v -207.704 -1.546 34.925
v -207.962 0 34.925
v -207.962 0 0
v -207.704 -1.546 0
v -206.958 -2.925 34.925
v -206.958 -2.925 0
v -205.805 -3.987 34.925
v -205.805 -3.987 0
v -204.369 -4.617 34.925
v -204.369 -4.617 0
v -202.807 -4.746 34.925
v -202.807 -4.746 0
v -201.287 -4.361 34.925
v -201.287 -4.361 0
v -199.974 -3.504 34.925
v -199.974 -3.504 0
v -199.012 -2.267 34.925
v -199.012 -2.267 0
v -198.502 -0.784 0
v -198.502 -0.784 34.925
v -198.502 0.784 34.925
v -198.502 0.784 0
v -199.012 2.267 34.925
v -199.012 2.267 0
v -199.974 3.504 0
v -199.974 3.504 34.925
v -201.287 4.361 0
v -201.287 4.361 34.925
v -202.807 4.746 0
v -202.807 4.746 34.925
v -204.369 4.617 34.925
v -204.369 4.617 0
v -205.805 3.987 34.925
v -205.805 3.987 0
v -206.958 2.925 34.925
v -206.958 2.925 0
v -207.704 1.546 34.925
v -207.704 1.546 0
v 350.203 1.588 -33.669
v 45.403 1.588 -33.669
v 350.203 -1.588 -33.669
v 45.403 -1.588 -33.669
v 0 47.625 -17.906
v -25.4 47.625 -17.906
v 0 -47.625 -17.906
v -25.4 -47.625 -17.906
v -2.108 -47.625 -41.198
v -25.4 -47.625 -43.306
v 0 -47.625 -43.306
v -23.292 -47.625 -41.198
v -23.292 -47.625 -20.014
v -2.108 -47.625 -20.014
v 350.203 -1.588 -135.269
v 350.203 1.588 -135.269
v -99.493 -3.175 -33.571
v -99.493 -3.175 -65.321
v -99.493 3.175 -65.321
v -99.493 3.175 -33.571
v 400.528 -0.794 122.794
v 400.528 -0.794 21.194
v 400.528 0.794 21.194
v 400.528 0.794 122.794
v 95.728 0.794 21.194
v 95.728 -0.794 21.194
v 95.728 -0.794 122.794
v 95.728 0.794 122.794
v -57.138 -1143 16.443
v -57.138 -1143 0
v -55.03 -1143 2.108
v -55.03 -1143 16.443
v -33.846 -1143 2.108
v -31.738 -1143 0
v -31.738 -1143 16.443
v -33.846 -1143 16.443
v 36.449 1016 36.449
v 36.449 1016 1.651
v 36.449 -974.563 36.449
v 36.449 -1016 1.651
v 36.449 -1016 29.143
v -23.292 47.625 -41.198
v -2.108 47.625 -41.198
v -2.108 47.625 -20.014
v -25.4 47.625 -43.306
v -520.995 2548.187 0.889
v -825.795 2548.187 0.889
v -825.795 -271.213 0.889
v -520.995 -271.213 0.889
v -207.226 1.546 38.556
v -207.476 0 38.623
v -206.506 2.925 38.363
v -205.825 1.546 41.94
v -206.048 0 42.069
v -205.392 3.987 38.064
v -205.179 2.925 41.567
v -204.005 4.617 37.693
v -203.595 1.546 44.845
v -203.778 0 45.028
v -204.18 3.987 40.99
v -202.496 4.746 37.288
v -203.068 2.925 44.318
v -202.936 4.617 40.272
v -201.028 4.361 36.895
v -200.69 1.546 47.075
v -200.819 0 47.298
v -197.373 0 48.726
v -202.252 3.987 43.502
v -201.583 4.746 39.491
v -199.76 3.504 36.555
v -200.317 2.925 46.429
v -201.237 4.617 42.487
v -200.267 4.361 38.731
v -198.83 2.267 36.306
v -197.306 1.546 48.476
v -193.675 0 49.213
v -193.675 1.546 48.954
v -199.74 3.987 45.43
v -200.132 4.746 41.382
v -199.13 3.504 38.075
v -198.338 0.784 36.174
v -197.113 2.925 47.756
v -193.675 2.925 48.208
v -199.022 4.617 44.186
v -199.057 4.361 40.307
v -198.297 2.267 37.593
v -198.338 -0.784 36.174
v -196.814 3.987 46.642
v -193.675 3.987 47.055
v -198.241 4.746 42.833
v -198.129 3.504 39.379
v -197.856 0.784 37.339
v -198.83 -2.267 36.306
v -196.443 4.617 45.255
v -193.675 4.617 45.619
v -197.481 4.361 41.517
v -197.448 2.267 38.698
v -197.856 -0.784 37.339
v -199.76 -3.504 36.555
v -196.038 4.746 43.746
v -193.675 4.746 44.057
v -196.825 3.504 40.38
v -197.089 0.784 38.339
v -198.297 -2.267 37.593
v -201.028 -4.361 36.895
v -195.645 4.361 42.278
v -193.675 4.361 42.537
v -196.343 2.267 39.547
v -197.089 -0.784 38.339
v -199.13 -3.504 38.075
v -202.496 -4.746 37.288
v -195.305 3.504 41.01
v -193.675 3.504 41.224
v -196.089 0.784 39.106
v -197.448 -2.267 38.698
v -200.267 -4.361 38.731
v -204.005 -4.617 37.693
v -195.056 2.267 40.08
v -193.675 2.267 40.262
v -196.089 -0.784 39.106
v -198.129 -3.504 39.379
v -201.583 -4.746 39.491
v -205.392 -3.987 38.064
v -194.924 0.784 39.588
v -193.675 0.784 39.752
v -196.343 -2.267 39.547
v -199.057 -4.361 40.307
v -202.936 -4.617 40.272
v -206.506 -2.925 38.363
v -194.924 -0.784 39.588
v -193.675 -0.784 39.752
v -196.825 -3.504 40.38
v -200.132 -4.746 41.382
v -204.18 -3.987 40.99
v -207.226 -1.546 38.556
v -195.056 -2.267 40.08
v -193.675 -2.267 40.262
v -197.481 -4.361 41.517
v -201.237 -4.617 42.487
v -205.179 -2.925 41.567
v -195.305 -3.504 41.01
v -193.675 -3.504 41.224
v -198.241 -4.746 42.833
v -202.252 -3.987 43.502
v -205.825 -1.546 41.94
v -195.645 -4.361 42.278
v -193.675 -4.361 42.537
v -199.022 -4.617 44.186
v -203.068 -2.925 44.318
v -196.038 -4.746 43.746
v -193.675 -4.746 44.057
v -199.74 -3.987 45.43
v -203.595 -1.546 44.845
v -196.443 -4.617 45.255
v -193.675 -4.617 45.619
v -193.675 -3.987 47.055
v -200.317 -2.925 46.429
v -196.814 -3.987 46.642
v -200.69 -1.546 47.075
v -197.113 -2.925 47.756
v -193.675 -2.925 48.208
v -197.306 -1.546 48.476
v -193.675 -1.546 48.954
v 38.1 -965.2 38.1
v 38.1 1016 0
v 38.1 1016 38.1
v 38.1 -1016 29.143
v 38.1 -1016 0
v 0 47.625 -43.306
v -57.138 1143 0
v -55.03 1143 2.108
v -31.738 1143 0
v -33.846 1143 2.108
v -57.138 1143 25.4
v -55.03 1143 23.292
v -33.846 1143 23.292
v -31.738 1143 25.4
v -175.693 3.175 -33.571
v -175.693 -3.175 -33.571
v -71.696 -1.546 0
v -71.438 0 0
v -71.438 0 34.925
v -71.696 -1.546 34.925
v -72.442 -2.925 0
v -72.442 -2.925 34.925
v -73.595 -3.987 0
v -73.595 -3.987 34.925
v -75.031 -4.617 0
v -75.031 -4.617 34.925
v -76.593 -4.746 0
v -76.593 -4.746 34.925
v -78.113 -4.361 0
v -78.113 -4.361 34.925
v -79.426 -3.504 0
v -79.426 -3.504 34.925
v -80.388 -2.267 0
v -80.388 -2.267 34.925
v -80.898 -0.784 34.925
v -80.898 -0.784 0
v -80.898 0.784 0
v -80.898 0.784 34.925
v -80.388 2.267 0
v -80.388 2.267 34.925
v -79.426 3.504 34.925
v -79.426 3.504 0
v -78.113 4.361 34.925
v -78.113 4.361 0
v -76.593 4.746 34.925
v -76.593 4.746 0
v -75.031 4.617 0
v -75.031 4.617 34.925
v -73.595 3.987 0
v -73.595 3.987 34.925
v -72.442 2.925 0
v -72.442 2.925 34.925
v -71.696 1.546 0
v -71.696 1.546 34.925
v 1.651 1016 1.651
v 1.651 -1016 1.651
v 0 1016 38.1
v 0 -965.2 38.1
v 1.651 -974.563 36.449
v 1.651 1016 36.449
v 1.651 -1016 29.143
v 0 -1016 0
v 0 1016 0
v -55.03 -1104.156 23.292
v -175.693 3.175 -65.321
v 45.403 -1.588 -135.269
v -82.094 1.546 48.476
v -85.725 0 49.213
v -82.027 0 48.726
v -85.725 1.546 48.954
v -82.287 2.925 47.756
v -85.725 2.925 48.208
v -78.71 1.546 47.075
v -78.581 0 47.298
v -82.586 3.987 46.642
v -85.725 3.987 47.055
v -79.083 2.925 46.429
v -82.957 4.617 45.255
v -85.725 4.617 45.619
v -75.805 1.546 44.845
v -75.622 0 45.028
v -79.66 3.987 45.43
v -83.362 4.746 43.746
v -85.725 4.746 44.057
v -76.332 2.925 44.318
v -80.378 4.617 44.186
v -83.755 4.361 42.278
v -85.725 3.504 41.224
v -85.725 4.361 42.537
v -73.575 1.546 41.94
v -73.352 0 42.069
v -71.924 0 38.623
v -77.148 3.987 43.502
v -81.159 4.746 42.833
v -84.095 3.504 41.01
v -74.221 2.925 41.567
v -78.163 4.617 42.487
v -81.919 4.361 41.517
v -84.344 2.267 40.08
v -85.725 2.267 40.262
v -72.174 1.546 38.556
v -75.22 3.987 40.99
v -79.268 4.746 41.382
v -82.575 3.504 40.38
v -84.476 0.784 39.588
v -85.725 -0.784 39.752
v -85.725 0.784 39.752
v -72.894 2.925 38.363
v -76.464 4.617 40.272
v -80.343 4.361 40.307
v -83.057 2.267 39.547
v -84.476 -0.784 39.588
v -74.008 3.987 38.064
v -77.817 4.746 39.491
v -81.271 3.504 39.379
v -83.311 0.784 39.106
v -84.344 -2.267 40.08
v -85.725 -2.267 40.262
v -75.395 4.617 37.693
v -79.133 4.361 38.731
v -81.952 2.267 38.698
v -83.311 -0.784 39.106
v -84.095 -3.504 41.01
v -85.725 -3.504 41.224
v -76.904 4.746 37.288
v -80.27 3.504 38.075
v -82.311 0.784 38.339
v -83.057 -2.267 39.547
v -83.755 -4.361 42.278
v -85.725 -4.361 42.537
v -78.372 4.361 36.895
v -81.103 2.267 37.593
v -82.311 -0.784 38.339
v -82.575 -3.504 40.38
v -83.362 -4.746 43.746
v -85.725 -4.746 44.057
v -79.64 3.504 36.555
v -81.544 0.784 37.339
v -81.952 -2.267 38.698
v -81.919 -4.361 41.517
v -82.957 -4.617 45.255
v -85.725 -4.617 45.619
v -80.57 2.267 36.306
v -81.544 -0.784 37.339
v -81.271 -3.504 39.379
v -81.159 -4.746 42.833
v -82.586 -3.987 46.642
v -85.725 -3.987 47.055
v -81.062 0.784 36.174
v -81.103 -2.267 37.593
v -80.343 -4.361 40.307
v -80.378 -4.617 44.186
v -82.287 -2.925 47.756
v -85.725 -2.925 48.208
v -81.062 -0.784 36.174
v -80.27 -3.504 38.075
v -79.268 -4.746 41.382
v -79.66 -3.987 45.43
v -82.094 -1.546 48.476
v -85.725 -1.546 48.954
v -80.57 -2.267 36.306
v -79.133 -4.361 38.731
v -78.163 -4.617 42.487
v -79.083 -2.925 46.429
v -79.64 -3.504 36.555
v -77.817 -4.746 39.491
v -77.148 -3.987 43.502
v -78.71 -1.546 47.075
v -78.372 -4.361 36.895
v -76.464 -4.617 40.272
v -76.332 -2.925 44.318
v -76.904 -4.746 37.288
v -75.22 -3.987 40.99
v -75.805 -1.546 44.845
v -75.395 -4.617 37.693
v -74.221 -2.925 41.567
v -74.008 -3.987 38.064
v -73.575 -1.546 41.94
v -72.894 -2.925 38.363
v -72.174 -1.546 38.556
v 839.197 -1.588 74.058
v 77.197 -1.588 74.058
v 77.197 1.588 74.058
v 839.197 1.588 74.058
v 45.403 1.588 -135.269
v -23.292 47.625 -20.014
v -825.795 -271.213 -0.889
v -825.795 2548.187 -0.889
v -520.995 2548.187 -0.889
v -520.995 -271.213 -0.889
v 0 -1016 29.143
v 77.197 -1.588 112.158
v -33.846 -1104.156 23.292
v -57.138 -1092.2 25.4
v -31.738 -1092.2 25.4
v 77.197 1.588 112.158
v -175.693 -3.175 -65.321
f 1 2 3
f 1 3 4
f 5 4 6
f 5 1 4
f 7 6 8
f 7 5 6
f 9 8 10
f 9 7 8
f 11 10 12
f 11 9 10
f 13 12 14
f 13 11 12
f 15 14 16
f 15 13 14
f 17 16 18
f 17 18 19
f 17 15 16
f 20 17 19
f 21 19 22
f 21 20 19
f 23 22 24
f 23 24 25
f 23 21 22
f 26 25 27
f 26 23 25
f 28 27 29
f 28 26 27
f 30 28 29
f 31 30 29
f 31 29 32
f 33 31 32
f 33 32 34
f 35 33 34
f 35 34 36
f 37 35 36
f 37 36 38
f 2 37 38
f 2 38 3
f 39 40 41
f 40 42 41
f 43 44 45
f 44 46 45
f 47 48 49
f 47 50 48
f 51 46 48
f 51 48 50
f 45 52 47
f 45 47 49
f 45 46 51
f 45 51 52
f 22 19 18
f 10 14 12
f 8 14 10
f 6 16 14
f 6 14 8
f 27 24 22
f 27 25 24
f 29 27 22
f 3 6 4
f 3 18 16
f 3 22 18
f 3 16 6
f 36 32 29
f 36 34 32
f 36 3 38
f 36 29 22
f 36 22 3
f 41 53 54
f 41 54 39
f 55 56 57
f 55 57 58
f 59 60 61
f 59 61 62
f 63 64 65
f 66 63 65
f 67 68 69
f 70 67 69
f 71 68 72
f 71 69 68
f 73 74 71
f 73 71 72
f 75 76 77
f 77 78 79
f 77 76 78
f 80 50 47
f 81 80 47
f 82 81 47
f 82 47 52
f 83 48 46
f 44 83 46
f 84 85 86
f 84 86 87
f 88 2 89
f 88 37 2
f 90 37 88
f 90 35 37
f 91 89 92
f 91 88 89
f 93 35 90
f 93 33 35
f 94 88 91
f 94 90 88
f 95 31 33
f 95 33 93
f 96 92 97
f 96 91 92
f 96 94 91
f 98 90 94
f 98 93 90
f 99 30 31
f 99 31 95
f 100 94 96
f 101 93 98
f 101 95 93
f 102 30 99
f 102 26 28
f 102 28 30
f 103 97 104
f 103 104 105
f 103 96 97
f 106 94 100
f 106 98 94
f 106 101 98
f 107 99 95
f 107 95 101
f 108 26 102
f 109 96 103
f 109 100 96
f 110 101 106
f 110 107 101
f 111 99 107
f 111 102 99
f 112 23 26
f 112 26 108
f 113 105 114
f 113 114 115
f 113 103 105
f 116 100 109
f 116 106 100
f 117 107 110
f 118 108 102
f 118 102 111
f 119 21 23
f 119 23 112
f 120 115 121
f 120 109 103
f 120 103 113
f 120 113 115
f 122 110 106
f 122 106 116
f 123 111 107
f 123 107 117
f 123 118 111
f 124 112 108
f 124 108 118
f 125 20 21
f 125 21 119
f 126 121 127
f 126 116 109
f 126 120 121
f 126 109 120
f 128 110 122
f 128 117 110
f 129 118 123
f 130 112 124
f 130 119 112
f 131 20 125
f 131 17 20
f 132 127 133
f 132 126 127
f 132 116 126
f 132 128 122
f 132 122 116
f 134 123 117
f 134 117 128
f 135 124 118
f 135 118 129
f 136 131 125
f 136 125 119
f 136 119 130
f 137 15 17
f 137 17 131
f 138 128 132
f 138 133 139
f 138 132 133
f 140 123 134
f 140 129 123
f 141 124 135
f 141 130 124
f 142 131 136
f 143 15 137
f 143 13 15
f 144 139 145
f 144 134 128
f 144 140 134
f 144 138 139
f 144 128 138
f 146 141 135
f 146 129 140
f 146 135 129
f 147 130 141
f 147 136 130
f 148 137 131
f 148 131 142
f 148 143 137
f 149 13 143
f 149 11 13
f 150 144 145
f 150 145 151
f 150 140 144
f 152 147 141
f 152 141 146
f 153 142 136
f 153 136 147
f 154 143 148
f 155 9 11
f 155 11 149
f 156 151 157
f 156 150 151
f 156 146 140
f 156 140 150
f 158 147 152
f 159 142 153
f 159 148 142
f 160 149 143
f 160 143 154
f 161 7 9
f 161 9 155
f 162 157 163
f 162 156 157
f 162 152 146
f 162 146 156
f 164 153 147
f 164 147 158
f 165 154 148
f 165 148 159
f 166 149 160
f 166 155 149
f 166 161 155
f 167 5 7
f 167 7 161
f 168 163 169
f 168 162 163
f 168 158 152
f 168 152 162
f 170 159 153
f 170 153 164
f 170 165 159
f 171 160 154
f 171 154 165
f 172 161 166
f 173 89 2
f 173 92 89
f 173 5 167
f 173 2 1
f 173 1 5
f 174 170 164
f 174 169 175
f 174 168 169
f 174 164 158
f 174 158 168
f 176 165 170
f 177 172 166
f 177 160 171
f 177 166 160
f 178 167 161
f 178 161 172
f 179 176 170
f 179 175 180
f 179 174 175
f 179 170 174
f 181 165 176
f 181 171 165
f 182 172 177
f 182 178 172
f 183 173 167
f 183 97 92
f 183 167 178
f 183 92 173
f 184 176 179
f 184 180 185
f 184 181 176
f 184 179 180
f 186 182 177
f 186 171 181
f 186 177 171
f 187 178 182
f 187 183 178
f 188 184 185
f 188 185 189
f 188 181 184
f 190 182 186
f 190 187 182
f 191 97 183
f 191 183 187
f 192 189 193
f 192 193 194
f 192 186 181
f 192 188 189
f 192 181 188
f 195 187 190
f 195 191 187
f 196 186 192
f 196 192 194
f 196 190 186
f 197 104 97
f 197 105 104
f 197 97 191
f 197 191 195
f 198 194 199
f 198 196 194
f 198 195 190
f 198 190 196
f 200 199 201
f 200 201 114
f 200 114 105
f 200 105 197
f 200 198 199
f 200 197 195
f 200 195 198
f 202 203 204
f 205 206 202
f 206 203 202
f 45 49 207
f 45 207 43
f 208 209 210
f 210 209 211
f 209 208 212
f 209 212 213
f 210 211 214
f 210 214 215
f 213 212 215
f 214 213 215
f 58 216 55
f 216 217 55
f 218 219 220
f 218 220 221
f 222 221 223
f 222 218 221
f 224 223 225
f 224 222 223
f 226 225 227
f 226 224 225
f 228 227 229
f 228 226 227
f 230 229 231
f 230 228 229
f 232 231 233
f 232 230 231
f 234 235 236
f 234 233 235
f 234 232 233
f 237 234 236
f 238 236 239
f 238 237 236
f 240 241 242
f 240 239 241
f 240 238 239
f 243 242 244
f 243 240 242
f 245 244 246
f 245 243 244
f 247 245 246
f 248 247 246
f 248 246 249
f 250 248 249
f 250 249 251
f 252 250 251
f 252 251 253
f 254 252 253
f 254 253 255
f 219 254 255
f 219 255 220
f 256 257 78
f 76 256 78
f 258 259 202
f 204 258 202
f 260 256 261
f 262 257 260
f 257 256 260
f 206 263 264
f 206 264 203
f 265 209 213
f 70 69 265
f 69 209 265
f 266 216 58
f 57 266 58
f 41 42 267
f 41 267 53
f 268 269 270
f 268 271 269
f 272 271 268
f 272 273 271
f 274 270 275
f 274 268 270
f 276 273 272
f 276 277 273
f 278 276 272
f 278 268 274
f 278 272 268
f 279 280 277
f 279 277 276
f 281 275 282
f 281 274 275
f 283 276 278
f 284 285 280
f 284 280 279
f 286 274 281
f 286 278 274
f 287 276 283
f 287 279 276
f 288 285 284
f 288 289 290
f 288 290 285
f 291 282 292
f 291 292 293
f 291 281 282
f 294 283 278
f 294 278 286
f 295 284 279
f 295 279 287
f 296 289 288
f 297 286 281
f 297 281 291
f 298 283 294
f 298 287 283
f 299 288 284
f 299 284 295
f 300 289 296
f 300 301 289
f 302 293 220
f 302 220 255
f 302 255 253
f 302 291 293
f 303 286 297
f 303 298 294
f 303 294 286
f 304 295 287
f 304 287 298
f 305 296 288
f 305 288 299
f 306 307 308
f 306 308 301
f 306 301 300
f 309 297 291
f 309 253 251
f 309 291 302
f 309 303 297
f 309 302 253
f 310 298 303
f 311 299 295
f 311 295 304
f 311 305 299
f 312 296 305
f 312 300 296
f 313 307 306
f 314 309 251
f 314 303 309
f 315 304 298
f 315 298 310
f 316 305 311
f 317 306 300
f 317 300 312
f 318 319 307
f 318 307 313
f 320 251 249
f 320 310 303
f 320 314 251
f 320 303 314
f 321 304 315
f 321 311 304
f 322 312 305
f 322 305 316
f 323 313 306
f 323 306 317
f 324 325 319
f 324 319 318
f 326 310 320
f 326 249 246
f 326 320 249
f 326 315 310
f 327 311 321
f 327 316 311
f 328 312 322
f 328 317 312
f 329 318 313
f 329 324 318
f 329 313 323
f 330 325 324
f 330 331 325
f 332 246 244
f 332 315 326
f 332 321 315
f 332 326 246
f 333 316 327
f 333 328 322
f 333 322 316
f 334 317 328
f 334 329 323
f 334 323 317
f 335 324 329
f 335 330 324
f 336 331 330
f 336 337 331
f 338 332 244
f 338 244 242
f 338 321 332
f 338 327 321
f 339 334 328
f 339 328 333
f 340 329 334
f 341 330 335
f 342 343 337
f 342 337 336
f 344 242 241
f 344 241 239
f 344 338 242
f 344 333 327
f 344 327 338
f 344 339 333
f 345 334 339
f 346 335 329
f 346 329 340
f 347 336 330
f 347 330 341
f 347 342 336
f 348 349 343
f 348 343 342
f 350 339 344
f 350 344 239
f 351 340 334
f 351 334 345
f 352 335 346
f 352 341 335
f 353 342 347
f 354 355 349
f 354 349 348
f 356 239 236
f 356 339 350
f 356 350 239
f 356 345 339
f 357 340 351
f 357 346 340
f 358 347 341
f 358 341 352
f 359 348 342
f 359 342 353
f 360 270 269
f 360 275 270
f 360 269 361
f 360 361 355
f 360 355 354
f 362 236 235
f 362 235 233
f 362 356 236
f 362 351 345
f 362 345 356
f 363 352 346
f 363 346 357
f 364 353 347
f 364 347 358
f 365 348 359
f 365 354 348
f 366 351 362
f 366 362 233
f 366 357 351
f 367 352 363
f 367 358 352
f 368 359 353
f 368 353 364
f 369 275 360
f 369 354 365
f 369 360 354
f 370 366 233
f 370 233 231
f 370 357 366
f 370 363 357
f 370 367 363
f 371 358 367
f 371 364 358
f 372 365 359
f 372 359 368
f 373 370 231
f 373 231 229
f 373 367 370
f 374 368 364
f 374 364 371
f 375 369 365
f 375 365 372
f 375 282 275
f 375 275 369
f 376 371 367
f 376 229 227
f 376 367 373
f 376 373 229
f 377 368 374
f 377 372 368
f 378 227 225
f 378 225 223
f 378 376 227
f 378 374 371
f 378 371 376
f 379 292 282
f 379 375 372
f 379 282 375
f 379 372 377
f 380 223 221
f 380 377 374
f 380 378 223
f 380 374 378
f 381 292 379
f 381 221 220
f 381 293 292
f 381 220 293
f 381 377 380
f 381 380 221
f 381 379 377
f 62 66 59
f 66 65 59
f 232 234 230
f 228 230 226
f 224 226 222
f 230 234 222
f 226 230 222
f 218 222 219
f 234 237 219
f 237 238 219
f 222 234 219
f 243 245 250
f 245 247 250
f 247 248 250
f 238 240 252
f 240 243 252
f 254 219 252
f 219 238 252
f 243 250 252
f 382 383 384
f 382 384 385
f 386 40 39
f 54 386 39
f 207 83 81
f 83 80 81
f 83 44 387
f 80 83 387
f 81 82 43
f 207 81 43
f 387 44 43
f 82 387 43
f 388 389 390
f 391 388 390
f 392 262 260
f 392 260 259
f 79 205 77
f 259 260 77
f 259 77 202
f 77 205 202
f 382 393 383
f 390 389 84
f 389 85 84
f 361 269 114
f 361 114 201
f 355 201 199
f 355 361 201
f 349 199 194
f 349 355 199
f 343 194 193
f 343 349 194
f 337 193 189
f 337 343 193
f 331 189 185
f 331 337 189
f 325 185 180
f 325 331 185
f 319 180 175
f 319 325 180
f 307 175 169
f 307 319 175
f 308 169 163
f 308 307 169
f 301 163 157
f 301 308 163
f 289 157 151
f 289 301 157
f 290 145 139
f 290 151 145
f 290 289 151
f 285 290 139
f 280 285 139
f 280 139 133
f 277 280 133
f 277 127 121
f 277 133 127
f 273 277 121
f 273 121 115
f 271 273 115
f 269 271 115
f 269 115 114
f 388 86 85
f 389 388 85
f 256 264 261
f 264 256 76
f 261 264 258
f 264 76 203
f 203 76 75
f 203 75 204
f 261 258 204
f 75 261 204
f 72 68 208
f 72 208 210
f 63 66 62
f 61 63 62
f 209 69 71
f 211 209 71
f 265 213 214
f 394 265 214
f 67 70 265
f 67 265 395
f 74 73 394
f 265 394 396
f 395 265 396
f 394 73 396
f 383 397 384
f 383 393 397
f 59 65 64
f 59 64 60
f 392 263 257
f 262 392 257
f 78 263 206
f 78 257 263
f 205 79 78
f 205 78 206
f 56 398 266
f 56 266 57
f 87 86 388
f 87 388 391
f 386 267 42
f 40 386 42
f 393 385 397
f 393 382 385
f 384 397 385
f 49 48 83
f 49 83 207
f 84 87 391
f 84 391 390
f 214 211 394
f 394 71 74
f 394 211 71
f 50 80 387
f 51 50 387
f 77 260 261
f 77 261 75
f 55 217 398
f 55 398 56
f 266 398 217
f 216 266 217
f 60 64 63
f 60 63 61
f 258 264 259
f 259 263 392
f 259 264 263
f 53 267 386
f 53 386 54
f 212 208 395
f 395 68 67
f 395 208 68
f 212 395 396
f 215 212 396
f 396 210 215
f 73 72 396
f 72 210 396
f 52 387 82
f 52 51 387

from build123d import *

# Parameters (mm, degrees)
F0_W      = 38.1
F0_H      = 38.1
F0_W_2    = 34.798
F0_H_2    = 34.798
F1_DEPTH  = 1016
F2_W      = 25.4
F2_H      = 25.4
F2_W_2    = 21.1836
F2_H_2    = 21.1836
F3_DEPTH  = 1143
F4_W      = 25.4
F4_H      = 25.4
F4_W_2    = 21.1836
F4_H_2    = 21.1836
F5_DEPTH  = 47.625
F6_W      = 304.8
F6_H      = 101.6
F7_DEPTH  = 1.5875
F8_W      = 76.2
F8_H      = 31.75
F9_DEPTH  = 3.175
F11_R     = 4.7625
F13_W     = 304.8
F13_H     = 101.6
F14_DEPTH = 0.79375
F15_W     = 304.8
F15_H     = 2819.4
F16_DEPTH = 0.889
F18_DEPTH = 38.1
F20_DEPTH = 25.4
F22_DEPTH = 1.5875


with BuildPart() as f1:
    # F0 (on Front) → F1 (new body, symmetric)
    with BuildSketch(Plane.XZ):
        with Locations((19.05, 19.05)):
            Rectangle(F0_W, F0_H)
        with Locations((19.05, 19.05)):
            Rectangle(F0_W_2, F0_H_2, mode=Mode.SUBTRACT)
    extrude(amount=F1_DEPTH, both=True)

    # F17 (on face) → F18 (cut, through all)
    with BuildSketch(Plane.YZ.offset(38.1)):
        Polygon((-965.2, 38.1), (-1016, 38.1), (-1016, 29.14258938), align=None)
    extrude(amount=-F18_DEPTH, mode=Mode.SUBTRACT)


with BuildPart() as f3:
    # F2 (on Front) → F3 (new body, symmetric)
    with BuildSketch(Plane.XZ):
        with Locations((-44.4378267646, 12.7)):
            Rectangle(F2_W, F2_H)
        with Locations((-44.4378267646, 12.7)):
            Rectangle(F2_W_2, F2_H_2, mode=Mode.SUBTRACT)
    extrude(amount=F3_DEPTH, both=True)

    # F19 (on face) → F20 (cut, through all)
    with BuildSketch(Plane.YZ.offset(-31.7378267646)):
        Polygon((-1092.2, 25.4), (-1143, 25.4), (-1143, 16.44258938), align=None)
    extrude(amount=-F20_DEPTH, mode=Mode.SUBTRACT)


with BuildPart() as f5:
    # F4 (on Front) → F5 (new body, symmetric)
    with BuildSketch(Plane.XZ):
        with Locations((-12.7, -30.6061554372)):
            Rectangle(F4_W, F4_H)
        with Locations((-12.7, -30.6061554372)):
            Rectangle(F4_W_2, F4_H_2, mode=Mode.SUBTRACT)
    extrude(amount=F5_DEPTH, both=True)


with BuildPart() as f7:
    # F6 (on Front) → F7 (new body, symmetric)
    with BuildSketch(Plane.XZ):
        with Locations((197.8030491917, -84.4690985978)):
            Rectangle(F6_W, F6_H)
    extrude(amount=F7_DEPTH, both=True)


with BuildPart() as f9:
    # F8 (on Front) → F9 (new body, symmetric)
    with BuildSketch(Plane.XZ):
        with Locations((-137.5931432034, -49.4461301714)):
            Rectangle(F8_W, F8_H)
    extrude(amount=F9_DEPTH, both=True)


with BuildPart() as f12:
    # F12: sweep along a path in F10
    with BuildLine(Plane.XZ) as f12_path:
        Line((-203.2, 0), (-203.2, 34.925))
        ThreePointArc((-203.2, 34.925), (-200.4101920908, 41.6601920908), (-193.675, 44.45))
        Line((-193.675, 44.45), (-85.725, 44.45))
        ThreePointArc((-85.725, 44.45), (-78.9898079092, 41.6601920908), (-76.2, 34.925))
        Line((-76.2, 34.925), (-76.2, 0))
    # F11 (on Top) → F12 (sweep)
    with BuildSketch(Plane.XY):
        with Locations((-76.2, 0)):
            Circle(F11_R)
    sweep(path=f12_path.line)


with BuildPart() as f14:
    # F13 (on Front) → F14 (new body, symmetric)
    with BuildSketch(Plane.XZ):
        with Locations((248.1276057661, 71.9936672337)):
            Rectangle(F13_W, F13_H)
    extrude(amount=F14_DEPTH, both=True)


with BuildPart() as f16:
    # F15 (on Top) → F16 (new body, symmetric)
    with BuildSketch(Plane.XY):
        with Locations((-673.3946353197, 1138.4873669436)):
            Rectangle(F15_W, F15_H)
    extrude(amount=F16_DEPTH, both=True)


with BuildPart() as f22:
    # F21 (on Front) → F22 (new body, symmetric)
    with BuildSketch(Plane.XZ):
        Polygon((77.1970674396, 112.1580186248), (77.1970674396, 74.0580186248), (839.1970674396, 74.0580186248), align=None)
    extrude(amount=F22_DEPTH, both=True)


solid = Compound([f1.part, f3.part, f5.part, f7.part, f9.part, f12.part, f14.part, f16.part, f22.part])
